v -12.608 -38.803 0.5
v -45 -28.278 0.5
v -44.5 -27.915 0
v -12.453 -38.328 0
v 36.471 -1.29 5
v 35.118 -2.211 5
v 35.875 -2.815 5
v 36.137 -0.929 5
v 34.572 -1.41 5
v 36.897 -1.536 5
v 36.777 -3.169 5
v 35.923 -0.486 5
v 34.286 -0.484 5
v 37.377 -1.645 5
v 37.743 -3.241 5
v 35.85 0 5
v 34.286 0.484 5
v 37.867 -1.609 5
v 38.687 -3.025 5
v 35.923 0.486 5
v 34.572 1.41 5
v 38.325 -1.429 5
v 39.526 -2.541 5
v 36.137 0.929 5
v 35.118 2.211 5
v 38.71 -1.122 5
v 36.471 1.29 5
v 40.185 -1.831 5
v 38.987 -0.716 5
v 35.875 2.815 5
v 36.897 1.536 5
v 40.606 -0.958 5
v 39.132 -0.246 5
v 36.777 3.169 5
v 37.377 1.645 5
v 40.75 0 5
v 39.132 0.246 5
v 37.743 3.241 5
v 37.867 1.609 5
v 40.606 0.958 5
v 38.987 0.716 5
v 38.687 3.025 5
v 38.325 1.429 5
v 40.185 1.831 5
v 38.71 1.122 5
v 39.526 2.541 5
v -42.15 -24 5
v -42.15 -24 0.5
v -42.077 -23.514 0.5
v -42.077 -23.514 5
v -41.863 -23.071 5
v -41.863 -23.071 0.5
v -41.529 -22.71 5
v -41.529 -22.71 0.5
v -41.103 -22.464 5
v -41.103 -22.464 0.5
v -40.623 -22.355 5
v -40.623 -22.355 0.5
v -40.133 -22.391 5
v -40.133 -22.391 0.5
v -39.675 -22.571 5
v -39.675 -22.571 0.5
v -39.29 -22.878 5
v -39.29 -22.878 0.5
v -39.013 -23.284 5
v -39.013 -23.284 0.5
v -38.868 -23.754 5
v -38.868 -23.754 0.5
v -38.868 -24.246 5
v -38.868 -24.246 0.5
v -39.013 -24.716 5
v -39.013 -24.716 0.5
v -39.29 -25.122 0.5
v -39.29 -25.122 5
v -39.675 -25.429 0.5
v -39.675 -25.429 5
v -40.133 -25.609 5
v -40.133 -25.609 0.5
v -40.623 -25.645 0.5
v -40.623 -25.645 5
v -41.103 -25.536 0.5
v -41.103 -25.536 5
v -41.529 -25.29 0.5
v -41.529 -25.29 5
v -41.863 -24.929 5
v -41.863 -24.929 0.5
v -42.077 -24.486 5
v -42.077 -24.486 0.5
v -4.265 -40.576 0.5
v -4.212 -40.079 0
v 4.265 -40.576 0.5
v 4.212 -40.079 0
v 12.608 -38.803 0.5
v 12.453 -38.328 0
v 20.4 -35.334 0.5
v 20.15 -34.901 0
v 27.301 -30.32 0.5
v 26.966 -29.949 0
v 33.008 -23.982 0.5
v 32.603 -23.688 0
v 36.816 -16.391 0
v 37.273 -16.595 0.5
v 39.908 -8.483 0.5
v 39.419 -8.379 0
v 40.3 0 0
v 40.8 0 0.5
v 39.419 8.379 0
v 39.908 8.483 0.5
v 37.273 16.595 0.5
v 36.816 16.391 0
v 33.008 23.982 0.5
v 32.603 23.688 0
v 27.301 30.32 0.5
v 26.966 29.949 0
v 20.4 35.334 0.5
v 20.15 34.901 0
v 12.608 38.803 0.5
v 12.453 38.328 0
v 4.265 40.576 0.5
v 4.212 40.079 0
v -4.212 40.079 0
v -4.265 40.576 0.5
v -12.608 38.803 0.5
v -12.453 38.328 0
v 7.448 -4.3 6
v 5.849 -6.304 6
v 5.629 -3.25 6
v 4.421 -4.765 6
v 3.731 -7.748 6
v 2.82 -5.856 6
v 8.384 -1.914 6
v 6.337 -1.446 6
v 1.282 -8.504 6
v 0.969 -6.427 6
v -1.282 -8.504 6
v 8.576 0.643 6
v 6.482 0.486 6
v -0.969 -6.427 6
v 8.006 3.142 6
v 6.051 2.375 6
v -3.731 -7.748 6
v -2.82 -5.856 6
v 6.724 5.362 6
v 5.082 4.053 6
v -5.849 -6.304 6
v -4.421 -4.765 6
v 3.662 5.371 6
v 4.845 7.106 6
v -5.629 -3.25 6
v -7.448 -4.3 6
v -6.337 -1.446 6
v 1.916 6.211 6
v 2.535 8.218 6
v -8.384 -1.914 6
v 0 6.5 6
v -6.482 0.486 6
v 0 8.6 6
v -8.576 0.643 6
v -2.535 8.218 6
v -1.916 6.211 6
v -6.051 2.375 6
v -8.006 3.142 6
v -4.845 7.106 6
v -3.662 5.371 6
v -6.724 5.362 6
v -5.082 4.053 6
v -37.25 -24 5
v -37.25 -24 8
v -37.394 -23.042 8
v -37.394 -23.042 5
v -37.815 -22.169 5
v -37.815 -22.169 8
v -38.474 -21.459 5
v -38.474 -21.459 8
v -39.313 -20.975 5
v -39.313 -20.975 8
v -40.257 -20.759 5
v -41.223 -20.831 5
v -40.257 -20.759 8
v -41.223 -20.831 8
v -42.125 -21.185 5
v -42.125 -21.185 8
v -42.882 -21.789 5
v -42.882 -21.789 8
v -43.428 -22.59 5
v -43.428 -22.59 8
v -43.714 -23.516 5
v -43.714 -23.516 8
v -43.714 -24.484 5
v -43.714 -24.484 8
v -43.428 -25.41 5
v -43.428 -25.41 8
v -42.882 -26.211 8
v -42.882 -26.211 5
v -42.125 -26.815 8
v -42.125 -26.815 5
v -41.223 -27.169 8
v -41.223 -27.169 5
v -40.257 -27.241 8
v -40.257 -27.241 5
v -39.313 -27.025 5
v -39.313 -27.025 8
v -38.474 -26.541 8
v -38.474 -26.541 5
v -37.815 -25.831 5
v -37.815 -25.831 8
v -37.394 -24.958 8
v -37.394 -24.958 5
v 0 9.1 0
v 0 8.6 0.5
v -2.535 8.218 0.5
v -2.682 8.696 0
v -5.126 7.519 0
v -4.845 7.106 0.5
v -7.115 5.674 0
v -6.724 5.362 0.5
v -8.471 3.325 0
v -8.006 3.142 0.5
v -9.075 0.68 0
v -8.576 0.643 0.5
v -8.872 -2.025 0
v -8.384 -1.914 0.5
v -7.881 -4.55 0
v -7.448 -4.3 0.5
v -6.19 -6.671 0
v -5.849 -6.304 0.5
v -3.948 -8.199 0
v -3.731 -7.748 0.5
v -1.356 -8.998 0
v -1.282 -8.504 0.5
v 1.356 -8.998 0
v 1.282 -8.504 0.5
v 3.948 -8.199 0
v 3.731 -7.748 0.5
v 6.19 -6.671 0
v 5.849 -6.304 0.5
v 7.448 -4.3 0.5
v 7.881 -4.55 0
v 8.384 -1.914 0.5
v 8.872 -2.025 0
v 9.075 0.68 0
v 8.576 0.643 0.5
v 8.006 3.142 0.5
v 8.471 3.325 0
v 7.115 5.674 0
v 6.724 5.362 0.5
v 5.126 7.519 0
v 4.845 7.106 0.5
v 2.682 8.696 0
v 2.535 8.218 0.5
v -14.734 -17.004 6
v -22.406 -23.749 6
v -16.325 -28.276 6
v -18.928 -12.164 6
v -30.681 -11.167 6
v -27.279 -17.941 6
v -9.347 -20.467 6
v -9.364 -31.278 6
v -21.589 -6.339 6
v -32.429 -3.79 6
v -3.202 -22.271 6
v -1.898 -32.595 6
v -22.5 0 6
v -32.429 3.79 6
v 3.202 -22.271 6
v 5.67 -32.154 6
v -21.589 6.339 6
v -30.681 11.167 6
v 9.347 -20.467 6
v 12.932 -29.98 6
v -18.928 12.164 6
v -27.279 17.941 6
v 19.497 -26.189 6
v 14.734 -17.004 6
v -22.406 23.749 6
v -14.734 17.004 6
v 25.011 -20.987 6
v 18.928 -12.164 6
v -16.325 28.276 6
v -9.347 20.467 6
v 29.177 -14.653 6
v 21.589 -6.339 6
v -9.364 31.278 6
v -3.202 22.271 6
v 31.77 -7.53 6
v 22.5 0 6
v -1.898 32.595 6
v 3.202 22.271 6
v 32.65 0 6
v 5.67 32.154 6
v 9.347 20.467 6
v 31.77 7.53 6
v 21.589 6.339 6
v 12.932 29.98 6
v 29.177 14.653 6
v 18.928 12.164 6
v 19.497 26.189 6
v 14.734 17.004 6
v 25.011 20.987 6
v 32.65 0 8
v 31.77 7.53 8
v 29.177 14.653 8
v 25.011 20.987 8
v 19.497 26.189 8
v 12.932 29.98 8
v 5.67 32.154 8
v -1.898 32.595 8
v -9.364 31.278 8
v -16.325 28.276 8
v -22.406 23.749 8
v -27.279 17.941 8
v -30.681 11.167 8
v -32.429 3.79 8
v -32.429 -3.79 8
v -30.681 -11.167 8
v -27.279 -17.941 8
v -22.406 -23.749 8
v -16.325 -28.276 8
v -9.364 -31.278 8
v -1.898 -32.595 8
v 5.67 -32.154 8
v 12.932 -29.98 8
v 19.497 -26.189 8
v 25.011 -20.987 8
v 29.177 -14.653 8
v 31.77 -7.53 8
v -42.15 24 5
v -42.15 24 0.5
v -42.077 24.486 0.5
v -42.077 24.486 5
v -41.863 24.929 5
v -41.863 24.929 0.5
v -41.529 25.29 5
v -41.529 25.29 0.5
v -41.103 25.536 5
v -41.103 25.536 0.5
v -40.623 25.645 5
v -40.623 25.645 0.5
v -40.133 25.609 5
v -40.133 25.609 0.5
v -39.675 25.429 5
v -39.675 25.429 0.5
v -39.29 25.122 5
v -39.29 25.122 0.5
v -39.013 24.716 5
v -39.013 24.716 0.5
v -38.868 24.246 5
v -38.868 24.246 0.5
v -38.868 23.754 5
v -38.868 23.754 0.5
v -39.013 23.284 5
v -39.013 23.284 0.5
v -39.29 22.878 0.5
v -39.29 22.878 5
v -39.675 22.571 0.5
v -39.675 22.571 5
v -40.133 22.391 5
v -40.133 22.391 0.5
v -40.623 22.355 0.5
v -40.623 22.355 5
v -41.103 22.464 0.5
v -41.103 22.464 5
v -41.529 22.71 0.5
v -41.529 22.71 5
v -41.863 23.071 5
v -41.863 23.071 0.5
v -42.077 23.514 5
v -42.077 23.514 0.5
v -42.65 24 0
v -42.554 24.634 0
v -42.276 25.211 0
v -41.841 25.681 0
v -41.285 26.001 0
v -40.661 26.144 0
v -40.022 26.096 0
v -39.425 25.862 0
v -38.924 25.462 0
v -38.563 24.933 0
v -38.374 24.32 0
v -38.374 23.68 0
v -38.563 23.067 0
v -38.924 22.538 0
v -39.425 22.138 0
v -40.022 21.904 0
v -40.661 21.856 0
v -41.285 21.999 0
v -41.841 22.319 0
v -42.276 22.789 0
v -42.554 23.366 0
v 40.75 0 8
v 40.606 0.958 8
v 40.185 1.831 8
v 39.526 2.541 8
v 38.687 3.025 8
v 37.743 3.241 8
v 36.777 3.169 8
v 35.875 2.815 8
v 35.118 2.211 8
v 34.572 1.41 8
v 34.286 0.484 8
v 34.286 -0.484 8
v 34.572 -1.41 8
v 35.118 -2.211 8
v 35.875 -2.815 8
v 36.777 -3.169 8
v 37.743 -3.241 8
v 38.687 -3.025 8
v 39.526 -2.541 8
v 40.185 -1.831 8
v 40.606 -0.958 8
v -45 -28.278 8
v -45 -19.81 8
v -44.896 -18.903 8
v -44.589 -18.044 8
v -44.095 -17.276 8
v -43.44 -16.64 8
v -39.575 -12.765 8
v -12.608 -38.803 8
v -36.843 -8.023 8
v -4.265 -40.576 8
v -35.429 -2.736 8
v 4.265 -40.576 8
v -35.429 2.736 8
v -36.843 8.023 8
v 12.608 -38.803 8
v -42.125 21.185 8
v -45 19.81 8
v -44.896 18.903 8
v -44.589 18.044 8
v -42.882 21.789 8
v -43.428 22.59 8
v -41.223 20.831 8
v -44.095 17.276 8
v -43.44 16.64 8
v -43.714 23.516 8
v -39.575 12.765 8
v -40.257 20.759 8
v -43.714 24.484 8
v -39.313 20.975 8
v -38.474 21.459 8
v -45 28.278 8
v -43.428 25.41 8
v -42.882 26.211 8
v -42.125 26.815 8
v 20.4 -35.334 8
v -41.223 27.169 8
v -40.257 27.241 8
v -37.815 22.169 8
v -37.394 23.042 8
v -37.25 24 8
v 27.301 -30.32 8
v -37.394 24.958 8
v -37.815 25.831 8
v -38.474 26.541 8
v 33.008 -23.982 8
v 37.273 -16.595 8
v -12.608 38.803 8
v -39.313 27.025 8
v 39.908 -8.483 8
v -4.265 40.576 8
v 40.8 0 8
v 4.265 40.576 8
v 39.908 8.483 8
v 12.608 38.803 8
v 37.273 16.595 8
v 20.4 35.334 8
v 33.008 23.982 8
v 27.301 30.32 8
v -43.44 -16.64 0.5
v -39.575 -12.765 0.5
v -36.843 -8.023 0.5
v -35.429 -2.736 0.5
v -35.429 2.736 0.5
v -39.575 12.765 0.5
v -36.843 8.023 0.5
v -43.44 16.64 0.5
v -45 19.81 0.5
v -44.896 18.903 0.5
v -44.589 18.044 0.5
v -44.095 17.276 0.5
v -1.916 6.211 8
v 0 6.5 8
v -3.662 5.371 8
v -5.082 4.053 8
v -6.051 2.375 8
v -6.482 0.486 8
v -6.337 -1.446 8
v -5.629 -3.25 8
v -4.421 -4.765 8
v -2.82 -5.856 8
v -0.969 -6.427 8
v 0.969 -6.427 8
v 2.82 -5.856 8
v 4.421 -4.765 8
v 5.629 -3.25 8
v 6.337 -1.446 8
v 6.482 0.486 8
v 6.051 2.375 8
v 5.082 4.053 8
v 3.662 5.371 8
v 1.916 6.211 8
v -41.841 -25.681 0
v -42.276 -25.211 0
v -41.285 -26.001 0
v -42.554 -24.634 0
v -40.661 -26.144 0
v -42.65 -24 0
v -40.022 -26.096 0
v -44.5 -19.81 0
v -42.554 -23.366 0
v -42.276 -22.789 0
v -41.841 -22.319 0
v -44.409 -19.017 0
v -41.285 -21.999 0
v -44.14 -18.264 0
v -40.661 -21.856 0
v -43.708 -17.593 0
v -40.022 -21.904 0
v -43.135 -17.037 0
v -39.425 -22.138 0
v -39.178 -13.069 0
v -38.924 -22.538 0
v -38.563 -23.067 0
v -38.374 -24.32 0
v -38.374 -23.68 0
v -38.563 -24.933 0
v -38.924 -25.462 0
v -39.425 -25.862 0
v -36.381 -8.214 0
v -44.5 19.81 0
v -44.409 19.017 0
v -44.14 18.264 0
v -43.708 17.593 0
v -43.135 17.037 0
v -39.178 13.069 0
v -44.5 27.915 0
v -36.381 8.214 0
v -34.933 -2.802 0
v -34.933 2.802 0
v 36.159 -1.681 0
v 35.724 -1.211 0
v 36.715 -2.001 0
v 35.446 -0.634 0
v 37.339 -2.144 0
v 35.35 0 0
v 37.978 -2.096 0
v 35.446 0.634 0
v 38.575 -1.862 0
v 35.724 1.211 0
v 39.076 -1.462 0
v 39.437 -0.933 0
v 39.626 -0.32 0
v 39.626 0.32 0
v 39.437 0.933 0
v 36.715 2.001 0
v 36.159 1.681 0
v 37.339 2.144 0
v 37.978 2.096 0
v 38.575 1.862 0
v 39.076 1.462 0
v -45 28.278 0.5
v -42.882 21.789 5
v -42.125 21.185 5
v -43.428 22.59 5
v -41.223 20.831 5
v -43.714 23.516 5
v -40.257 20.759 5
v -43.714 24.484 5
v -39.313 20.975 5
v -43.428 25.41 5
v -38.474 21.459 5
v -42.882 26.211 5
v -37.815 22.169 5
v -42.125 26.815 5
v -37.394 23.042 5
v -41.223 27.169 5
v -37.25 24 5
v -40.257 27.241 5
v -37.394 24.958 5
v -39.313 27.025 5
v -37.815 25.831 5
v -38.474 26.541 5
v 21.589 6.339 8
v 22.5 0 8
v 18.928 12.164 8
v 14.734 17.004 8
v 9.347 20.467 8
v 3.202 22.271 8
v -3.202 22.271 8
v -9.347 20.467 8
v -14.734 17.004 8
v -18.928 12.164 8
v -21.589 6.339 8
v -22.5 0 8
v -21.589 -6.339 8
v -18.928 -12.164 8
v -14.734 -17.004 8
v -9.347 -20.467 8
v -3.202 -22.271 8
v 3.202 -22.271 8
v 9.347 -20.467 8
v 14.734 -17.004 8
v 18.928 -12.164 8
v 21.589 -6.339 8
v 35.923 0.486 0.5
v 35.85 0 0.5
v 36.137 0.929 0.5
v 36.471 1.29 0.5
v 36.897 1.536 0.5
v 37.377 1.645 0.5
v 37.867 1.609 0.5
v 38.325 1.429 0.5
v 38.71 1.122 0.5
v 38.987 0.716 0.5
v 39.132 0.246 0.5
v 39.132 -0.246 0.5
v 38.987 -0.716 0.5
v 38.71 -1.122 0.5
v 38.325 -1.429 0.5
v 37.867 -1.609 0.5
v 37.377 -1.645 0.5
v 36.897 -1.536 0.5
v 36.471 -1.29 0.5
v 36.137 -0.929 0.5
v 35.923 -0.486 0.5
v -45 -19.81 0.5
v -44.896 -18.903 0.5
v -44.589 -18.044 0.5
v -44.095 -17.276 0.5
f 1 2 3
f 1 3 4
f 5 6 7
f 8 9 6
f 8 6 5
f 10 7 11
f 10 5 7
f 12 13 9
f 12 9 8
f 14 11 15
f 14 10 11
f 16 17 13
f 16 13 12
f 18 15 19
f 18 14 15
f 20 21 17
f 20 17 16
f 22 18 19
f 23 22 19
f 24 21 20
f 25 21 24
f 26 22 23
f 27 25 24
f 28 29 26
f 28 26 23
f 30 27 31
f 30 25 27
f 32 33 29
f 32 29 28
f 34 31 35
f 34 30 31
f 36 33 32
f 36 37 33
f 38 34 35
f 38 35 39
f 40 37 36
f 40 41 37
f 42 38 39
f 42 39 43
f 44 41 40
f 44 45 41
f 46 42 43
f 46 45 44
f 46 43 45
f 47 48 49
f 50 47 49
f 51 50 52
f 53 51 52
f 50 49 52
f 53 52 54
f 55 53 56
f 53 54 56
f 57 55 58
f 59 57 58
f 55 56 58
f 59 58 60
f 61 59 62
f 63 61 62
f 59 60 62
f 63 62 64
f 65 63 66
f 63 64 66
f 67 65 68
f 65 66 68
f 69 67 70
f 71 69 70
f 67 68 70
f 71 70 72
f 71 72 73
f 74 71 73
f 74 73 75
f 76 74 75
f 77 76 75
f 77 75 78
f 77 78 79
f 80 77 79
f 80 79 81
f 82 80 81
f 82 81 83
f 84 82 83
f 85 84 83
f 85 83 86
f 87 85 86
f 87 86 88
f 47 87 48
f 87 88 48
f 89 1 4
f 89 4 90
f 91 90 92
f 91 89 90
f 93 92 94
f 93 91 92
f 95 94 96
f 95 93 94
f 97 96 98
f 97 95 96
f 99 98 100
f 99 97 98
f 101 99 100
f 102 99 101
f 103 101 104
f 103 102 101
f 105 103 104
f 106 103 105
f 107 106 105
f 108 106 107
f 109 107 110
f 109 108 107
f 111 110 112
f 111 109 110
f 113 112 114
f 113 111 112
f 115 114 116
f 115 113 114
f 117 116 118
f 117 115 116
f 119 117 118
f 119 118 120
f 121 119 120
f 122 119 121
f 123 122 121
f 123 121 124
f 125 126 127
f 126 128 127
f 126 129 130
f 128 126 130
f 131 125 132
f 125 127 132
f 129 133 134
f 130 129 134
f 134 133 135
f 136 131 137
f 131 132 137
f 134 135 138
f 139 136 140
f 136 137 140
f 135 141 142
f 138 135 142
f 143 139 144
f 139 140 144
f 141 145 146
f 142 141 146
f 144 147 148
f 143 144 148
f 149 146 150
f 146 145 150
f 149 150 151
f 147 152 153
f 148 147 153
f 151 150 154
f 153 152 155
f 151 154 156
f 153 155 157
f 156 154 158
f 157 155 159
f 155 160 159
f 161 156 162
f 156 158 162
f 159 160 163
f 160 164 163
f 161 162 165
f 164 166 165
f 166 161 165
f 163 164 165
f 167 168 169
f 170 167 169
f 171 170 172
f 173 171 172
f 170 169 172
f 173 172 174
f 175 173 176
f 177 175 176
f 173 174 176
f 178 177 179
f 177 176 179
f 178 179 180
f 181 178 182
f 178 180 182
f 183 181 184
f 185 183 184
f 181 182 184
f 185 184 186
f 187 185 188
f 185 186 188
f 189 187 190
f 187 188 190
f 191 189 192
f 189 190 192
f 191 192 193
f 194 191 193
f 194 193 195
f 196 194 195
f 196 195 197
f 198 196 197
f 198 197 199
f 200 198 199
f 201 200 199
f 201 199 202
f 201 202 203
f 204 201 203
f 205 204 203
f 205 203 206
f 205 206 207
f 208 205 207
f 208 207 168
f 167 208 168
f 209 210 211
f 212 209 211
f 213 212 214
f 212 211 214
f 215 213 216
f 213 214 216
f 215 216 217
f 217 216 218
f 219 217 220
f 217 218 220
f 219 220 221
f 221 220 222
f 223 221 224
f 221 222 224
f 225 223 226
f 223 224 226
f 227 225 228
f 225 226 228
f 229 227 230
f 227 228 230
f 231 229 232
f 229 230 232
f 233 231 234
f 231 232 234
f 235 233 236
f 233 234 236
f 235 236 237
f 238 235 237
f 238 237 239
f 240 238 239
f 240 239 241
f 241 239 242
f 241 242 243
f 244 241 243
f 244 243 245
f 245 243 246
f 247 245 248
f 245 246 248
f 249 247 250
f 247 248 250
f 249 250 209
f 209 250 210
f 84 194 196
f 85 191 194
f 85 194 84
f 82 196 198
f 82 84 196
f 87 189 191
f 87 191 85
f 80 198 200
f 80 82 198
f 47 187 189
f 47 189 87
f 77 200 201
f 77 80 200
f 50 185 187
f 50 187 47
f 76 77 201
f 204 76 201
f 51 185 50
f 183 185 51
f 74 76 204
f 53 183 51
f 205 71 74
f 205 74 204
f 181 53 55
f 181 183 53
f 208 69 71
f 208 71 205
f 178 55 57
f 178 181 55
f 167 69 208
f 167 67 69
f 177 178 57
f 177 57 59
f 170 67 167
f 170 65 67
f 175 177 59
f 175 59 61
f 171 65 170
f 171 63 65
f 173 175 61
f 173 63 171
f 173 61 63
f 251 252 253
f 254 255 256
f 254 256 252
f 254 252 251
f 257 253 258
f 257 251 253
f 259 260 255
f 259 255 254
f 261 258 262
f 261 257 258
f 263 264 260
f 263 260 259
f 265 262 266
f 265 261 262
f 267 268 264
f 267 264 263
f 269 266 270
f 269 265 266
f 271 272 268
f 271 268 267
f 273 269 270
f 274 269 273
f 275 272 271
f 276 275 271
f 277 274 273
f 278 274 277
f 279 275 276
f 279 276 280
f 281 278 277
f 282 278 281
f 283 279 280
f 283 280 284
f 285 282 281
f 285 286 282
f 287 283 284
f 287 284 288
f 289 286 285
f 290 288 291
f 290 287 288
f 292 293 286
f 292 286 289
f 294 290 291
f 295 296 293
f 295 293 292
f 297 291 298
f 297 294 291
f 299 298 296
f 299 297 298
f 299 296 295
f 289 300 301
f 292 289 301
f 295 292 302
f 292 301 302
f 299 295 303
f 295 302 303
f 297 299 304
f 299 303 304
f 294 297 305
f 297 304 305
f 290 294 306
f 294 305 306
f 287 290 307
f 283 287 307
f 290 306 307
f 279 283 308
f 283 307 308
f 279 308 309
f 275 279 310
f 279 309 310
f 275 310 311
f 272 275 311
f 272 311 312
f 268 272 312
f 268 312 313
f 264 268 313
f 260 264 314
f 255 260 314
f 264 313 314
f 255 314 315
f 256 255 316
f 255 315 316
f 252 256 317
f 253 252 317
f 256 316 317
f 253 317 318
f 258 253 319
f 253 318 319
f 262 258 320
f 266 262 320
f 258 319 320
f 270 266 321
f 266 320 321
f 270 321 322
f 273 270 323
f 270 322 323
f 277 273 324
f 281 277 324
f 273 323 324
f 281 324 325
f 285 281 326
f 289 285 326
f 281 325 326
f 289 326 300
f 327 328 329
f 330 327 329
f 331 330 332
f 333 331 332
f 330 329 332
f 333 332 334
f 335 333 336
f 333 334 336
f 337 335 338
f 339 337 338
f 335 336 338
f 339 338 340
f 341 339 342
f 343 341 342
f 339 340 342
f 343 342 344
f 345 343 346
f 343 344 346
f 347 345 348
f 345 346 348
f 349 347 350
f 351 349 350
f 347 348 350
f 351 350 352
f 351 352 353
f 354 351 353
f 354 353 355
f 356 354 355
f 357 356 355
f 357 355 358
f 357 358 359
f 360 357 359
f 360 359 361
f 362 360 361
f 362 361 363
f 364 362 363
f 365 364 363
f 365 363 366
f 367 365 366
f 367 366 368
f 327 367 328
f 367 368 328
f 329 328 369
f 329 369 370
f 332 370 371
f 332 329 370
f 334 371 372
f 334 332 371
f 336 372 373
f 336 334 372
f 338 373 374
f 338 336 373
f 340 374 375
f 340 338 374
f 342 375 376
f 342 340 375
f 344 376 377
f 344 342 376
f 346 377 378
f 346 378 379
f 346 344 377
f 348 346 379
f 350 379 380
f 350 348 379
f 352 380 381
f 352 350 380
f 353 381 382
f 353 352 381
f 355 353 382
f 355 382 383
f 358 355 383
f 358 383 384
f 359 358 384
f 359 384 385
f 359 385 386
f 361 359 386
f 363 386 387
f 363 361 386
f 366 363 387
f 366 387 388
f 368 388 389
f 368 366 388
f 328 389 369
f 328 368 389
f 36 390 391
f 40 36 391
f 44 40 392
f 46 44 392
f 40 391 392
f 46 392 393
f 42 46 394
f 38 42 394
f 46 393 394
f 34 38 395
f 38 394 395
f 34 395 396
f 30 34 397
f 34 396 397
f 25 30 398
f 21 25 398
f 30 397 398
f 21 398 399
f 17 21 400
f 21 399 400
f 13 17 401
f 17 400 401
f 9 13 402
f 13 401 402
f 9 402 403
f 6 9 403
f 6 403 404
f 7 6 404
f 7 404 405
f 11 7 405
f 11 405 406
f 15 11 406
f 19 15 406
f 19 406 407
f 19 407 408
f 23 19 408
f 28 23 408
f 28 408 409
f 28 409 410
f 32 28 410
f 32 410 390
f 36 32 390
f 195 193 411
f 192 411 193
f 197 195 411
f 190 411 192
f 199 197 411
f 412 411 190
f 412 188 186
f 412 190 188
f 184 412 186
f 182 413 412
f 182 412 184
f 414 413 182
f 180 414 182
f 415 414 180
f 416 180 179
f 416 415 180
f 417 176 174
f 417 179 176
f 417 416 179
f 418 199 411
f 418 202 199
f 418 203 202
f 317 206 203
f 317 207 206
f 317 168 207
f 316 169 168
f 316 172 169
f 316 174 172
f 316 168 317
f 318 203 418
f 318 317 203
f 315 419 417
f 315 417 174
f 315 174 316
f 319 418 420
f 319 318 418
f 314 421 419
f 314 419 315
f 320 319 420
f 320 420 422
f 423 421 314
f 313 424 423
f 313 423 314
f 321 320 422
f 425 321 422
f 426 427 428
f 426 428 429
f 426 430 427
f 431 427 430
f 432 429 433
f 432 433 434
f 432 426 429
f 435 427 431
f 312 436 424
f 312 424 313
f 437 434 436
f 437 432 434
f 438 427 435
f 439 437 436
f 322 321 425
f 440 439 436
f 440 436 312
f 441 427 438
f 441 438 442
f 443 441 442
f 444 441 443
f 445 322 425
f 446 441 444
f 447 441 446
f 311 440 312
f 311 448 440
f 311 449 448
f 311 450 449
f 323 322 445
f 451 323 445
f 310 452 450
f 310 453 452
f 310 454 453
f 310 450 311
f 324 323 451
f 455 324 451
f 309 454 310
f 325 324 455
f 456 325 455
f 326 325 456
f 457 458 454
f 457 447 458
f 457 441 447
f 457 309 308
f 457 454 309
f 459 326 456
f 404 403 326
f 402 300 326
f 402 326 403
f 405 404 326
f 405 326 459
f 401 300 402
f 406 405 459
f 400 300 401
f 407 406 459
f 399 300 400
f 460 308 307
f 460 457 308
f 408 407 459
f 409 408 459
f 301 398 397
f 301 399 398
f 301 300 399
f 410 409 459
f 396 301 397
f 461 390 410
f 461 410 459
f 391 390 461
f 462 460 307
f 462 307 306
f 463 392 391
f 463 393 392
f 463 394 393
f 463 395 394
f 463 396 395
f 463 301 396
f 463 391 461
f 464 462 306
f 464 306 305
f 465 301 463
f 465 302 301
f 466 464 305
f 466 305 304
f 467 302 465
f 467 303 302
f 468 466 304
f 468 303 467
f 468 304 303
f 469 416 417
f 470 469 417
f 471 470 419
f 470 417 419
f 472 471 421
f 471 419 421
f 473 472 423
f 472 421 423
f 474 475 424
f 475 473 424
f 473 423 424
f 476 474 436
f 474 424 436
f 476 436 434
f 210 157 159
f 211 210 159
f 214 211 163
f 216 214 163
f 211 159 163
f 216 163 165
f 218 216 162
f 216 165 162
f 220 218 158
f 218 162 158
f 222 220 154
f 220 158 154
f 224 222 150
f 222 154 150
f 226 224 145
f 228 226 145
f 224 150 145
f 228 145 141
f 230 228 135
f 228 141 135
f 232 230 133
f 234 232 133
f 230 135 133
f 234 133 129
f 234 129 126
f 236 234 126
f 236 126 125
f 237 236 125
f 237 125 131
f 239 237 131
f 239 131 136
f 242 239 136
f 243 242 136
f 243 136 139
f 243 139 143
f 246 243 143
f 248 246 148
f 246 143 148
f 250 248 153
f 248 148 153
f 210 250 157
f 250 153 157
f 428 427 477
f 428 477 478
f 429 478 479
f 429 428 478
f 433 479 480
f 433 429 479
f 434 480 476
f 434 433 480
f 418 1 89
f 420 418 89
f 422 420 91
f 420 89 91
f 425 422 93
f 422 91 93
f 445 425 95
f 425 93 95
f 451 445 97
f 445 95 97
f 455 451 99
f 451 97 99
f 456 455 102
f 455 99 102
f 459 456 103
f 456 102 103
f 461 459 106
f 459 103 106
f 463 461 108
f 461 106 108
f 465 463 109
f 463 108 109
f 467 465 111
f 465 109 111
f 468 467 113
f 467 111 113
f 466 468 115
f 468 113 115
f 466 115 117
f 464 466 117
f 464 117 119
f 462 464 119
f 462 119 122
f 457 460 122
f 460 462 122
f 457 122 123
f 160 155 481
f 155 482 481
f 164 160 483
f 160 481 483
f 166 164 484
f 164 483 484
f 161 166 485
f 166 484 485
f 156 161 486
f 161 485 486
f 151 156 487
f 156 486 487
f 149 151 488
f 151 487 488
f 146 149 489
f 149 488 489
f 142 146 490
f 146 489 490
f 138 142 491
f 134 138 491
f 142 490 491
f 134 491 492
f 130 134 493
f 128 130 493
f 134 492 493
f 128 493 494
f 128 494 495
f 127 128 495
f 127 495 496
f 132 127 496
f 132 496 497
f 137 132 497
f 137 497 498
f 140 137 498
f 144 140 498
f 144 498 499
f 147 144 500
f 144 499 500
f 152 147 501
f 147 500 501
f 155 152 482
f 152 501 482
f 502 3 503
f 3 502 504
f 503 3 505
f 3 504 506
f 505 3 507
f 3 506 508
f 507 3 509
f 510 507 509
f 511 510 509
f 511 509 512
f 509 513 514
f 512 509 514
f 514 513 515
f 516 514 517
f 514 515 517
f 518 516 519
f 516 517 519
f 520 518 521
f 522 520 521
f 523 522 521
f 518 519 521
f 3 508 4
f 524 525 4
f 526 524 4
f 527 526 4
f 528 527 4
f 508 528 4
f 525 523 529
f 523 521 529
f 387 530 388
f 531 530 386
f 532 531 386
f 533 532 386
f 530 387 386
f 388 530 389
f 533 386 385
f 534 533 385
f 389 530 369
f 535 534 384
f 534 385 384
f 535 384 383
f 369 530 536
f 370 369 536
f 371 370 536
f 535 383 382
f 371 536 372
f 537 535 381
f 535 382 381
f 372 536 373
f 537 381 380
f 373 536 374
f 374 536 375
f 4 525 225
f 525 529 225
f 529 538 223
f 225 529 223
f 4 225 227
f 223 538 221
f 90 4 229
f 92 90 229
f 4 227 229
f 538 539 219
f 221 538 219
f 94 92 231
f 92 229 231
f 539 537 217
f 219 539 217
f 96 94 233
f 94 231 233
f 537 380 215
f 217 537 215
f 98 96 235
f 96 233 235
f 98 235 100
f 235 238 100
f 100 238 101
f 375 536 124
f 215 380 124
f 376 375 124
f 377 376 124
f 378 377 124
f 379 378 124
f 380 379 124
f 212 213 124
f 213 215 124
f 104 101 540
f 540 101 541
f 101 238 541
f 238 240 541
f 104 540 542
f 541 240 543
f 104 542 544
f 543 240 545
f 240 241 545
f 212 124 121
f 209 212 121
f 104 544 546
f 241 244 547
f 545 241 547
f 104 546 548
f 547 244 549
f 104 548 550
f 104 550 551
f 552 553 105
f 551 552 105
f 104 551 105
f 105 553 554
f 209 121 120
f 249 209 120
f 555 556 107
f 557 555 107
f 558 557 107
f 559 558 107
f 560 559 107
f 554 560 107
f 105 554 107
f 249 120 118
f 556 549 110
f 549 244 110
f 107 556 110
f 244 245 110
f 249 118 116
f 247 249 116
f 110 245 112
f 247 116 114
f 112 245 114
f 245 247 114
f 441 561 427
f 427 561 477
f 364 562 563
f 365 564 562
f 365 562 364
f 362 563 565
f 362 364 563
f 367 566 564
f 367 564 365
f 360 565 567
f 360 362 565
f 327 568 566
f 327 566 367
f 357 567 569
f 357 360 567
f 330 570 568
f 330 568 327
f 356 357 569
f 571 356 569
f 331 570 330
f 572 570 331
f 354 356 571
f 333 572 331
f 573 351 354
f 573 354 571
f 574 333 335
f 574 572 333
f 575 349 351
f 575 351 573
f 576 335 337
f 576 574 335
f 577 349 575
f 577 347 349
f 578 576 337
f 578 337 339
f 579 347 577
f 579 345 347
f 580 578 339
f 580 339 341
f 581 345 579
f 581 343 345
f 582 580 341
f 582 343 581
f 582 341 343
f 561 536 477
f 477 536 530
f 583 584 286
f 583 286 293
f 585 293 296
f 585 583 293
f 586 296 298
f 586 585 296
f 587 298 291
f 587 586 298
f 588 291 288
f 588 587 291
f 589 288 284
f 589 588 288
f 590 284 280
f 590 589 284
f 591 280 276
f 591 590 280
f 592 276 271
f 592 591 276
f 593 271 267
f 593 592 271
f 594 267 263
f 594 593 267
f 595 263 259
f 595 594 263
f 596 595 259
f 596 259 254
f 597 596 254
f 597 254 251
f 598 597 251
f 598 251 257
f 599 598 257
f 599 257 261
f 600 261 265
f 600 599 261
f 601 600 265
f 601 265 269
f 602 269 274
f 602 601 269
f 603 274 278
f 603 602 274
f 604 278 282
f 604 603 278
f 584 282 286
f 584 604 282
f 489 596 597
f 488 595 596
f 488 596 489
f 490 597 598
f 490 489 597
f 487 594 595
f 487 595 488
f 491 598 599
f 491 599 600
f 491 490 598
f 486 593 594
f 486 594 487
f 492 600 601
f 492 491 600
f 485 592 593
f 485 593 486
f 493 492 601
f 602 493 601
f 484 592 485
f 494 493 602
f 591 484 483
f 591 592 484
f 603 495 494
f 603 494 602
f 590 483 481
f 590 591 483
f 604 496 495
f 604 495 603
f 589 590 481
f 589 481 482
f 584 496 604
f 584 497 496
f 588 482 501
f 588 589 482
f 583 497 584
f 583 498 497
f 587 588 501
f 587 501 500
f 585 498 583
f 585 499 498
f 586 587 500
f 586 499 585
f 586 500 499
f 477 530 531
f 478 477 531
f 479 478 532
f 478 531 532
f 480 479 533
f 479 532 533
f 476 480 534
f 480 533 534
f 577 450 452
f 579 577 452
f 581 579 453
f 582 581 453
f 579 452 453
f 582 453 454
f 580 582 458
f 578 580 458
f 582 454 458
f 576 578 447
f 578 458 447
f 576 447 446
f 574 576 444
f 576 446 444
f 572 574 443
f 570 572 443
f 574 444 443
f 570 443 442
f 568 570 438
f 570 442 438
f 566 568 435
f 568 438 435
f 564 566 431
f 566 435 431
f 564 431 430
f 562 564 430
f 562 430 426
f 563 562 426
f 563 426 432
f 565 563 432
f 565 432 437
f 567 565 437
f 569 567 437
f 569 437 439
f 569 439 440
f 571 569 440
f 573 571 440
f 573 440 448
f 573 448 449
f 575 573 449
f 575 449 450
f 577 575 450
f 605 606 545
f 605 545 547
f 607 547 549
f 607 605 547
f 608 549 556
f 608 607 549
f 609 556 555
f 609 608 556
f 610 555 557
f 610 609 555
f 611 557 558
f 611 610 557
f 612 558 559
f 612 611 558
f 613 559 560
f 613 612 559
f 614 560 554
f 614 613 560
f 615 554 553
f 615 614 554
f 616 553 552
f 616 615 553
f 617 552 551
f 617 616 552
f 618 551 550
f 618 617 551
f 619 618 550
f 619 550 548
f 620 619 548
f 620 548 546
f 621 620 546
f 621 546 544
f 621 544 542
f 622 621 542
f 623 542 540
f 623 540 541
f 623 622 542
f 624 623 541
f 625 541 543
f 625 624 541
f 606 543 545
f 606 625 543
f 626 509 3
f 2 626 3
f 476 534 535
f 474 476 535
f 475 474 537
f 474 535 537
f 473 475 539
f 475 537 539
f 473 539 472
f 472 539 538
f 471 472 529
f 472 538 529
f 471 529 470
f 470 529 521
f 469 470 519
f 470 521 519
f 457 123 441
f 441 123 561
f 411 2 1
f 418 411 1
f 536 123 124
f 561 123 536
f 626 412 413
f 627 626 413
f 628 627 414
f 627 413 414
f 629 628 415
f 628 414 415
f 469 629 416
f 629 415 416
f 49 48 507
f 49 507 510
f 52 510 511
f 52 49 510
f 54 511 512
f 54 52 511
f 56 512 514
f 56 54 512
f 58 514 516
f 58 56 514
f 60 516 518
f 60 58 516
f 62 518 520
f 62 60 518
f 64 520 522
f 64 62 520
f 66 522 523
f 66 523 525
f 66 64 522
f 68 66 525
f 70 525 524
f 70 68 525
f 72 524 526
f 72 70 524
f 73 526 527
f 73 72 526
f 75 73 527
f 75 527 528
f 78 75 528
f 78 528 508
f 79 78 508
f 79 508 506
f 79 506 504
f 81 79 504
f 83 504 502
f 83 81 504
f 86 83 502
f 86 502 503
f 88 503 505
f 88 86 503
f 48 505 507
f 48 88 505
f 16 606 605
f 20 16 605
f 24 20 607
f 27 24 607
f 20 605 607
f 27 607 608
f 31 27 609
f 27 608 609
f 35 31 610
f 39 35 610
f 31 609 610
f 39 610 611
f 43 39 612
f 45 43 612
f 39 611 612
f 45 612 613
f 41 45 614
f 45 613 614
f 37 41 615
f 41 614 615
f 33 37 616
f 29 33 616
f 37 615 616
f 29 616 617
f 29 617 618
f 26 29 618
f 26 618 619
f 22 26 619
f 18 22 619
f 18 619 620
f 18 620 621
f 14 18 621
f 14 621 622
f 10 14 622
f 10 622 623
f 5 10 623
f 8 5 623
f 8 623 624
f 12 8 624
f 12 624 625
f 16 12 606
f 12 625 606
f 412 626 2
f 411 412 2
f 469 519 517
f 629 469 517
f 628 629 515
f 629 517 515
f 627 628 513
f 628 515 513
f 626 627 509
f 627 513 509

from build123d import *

# Parameters (mm, degrees)
F0_R            = 40.8
F1_DEPTH        = 8
F4_R            = 32.65
F4_R_2          = 22.5
F5_DEPTH        = 2
F6_W            = 4.8
F6_H            = 38.4
F7_DEPTH        = 8.001
F9_DEPTH        = 8
F10_R           = 21
F11_DEPTH       = 8.001
F12_R           = 4
F14_D           = 3.3
F14_CBORE_D     = 6.5
F14_CBORE_DEPTH = 3
F15_SIZE        = 0.5


with BuildPart() as f1:
    # F0 (on Top) → F1 (new body)
    with BuildSketch(Plane.XY):
        Circle(F0_R)
    extrude(amount=F1_DEPTH)

    # F2 (on Right) → F3 (revolve, cut)
    with BuildSketch(Plane.YZ):
        Polygon((0, 8), (0, 0), (8.6, 0), (8.6, 6), (6.5, 6), (6.5, 8), align=None)
    revolve(axis=Axis((0, 0, 10.7360328796), (0, 0, 1)), mode=Mode.SUBTRACT)

    # F4 (on face) → F5 (cut)
    with BuildSketch(Plane.XY.offset(8)):
        Circle(F4_R)
        Circle(F4_R_2, mode=Mode.SUBTRACT)
    extrude(amount=-F5_DEPTH, mode=Mode.SUBTRACT)

    # F6 (on Top) → F7 (cut, through all)
    with BuildSketch(Plane.XY):
        with Locations((-38.4, 0)):
            Rectangle(F6_W, F6_H)
    extrude(amount=F7_DEPTH, mode=Mode.SUBTRACT)

    # F8 (on Top) → F9 (join, through all)
    with BuildSketch(Plane.XY):
        with BuildLine():
            Line((-45, 28.2782724184), (-45, -28.2782724184))
            Line((-45, -28.2782724184), (-12.6078933705, -38.8031058648))
            ThreePointArc((-12.6078933705, -38.8031058648), (-26.2059585661, -31.2711965814), (-36, -19.2))
            Line((-36, -19.2), (-36, 19.2))
            ThreePointArc((-36, 19.2), (-26.2059585661, 31.2711965814), (-12.6078933705, 38.8031058648))
            Line((-12.6078933705, 38.8031058648), (-45, 28.2782724184))
        make_face()
    extrude(amount=F9_DEPTH)

    # F10 (on face) → F11 (cut, through all)
    with BuildSketch(Plane.XY.offset(8)):
        with Locations((-56.25, 0)):
            Circle(F10_R)
    extrude(amount=-F11_DEPTH, mode=Mode.SUBTRACT)

    # F12
    f12_edges = [f1.edges().sort_by_distance(p)[0] for p in [
        (-45, -17.732386, 4),
        (-45, 17.732386, 4),
    ]]
    fillet(f12_edges, radius=F12_R)

    # F14 (through all)
    with Locations(Plane.XY.offset(8)):
        with Locations((-40.5, 24), (-40.5, -24), (37.5, 0)):
            CounterBoreHole(F14_D / 2, F14_CBORE_D / 2, F14_CBORE_DEPTH)

    # F15
    f15_edges = [f1.edges().sort_by_distance(p)[0] for p in [
        (-45, 24.044154, 0),
        (-44.588872, 18.043683, 0),
        (-28.803947, 33.540689, 0),
        (-35.25, 0, 0),
        (40.8, 0, 0),
        (-44.588872, -18.043683, 0),
        (-28.803947, -33.540689, 0),
        (-45, -24.044154, 0),
        (-42.15, -24, 0),
        (-42.15, 24, 0),
        (0, -8.6, 0),
        (35.85, 0, 0),
    ]]
    chamfer(f15_edges, length=F15_SIZE)


solid = f1.part
